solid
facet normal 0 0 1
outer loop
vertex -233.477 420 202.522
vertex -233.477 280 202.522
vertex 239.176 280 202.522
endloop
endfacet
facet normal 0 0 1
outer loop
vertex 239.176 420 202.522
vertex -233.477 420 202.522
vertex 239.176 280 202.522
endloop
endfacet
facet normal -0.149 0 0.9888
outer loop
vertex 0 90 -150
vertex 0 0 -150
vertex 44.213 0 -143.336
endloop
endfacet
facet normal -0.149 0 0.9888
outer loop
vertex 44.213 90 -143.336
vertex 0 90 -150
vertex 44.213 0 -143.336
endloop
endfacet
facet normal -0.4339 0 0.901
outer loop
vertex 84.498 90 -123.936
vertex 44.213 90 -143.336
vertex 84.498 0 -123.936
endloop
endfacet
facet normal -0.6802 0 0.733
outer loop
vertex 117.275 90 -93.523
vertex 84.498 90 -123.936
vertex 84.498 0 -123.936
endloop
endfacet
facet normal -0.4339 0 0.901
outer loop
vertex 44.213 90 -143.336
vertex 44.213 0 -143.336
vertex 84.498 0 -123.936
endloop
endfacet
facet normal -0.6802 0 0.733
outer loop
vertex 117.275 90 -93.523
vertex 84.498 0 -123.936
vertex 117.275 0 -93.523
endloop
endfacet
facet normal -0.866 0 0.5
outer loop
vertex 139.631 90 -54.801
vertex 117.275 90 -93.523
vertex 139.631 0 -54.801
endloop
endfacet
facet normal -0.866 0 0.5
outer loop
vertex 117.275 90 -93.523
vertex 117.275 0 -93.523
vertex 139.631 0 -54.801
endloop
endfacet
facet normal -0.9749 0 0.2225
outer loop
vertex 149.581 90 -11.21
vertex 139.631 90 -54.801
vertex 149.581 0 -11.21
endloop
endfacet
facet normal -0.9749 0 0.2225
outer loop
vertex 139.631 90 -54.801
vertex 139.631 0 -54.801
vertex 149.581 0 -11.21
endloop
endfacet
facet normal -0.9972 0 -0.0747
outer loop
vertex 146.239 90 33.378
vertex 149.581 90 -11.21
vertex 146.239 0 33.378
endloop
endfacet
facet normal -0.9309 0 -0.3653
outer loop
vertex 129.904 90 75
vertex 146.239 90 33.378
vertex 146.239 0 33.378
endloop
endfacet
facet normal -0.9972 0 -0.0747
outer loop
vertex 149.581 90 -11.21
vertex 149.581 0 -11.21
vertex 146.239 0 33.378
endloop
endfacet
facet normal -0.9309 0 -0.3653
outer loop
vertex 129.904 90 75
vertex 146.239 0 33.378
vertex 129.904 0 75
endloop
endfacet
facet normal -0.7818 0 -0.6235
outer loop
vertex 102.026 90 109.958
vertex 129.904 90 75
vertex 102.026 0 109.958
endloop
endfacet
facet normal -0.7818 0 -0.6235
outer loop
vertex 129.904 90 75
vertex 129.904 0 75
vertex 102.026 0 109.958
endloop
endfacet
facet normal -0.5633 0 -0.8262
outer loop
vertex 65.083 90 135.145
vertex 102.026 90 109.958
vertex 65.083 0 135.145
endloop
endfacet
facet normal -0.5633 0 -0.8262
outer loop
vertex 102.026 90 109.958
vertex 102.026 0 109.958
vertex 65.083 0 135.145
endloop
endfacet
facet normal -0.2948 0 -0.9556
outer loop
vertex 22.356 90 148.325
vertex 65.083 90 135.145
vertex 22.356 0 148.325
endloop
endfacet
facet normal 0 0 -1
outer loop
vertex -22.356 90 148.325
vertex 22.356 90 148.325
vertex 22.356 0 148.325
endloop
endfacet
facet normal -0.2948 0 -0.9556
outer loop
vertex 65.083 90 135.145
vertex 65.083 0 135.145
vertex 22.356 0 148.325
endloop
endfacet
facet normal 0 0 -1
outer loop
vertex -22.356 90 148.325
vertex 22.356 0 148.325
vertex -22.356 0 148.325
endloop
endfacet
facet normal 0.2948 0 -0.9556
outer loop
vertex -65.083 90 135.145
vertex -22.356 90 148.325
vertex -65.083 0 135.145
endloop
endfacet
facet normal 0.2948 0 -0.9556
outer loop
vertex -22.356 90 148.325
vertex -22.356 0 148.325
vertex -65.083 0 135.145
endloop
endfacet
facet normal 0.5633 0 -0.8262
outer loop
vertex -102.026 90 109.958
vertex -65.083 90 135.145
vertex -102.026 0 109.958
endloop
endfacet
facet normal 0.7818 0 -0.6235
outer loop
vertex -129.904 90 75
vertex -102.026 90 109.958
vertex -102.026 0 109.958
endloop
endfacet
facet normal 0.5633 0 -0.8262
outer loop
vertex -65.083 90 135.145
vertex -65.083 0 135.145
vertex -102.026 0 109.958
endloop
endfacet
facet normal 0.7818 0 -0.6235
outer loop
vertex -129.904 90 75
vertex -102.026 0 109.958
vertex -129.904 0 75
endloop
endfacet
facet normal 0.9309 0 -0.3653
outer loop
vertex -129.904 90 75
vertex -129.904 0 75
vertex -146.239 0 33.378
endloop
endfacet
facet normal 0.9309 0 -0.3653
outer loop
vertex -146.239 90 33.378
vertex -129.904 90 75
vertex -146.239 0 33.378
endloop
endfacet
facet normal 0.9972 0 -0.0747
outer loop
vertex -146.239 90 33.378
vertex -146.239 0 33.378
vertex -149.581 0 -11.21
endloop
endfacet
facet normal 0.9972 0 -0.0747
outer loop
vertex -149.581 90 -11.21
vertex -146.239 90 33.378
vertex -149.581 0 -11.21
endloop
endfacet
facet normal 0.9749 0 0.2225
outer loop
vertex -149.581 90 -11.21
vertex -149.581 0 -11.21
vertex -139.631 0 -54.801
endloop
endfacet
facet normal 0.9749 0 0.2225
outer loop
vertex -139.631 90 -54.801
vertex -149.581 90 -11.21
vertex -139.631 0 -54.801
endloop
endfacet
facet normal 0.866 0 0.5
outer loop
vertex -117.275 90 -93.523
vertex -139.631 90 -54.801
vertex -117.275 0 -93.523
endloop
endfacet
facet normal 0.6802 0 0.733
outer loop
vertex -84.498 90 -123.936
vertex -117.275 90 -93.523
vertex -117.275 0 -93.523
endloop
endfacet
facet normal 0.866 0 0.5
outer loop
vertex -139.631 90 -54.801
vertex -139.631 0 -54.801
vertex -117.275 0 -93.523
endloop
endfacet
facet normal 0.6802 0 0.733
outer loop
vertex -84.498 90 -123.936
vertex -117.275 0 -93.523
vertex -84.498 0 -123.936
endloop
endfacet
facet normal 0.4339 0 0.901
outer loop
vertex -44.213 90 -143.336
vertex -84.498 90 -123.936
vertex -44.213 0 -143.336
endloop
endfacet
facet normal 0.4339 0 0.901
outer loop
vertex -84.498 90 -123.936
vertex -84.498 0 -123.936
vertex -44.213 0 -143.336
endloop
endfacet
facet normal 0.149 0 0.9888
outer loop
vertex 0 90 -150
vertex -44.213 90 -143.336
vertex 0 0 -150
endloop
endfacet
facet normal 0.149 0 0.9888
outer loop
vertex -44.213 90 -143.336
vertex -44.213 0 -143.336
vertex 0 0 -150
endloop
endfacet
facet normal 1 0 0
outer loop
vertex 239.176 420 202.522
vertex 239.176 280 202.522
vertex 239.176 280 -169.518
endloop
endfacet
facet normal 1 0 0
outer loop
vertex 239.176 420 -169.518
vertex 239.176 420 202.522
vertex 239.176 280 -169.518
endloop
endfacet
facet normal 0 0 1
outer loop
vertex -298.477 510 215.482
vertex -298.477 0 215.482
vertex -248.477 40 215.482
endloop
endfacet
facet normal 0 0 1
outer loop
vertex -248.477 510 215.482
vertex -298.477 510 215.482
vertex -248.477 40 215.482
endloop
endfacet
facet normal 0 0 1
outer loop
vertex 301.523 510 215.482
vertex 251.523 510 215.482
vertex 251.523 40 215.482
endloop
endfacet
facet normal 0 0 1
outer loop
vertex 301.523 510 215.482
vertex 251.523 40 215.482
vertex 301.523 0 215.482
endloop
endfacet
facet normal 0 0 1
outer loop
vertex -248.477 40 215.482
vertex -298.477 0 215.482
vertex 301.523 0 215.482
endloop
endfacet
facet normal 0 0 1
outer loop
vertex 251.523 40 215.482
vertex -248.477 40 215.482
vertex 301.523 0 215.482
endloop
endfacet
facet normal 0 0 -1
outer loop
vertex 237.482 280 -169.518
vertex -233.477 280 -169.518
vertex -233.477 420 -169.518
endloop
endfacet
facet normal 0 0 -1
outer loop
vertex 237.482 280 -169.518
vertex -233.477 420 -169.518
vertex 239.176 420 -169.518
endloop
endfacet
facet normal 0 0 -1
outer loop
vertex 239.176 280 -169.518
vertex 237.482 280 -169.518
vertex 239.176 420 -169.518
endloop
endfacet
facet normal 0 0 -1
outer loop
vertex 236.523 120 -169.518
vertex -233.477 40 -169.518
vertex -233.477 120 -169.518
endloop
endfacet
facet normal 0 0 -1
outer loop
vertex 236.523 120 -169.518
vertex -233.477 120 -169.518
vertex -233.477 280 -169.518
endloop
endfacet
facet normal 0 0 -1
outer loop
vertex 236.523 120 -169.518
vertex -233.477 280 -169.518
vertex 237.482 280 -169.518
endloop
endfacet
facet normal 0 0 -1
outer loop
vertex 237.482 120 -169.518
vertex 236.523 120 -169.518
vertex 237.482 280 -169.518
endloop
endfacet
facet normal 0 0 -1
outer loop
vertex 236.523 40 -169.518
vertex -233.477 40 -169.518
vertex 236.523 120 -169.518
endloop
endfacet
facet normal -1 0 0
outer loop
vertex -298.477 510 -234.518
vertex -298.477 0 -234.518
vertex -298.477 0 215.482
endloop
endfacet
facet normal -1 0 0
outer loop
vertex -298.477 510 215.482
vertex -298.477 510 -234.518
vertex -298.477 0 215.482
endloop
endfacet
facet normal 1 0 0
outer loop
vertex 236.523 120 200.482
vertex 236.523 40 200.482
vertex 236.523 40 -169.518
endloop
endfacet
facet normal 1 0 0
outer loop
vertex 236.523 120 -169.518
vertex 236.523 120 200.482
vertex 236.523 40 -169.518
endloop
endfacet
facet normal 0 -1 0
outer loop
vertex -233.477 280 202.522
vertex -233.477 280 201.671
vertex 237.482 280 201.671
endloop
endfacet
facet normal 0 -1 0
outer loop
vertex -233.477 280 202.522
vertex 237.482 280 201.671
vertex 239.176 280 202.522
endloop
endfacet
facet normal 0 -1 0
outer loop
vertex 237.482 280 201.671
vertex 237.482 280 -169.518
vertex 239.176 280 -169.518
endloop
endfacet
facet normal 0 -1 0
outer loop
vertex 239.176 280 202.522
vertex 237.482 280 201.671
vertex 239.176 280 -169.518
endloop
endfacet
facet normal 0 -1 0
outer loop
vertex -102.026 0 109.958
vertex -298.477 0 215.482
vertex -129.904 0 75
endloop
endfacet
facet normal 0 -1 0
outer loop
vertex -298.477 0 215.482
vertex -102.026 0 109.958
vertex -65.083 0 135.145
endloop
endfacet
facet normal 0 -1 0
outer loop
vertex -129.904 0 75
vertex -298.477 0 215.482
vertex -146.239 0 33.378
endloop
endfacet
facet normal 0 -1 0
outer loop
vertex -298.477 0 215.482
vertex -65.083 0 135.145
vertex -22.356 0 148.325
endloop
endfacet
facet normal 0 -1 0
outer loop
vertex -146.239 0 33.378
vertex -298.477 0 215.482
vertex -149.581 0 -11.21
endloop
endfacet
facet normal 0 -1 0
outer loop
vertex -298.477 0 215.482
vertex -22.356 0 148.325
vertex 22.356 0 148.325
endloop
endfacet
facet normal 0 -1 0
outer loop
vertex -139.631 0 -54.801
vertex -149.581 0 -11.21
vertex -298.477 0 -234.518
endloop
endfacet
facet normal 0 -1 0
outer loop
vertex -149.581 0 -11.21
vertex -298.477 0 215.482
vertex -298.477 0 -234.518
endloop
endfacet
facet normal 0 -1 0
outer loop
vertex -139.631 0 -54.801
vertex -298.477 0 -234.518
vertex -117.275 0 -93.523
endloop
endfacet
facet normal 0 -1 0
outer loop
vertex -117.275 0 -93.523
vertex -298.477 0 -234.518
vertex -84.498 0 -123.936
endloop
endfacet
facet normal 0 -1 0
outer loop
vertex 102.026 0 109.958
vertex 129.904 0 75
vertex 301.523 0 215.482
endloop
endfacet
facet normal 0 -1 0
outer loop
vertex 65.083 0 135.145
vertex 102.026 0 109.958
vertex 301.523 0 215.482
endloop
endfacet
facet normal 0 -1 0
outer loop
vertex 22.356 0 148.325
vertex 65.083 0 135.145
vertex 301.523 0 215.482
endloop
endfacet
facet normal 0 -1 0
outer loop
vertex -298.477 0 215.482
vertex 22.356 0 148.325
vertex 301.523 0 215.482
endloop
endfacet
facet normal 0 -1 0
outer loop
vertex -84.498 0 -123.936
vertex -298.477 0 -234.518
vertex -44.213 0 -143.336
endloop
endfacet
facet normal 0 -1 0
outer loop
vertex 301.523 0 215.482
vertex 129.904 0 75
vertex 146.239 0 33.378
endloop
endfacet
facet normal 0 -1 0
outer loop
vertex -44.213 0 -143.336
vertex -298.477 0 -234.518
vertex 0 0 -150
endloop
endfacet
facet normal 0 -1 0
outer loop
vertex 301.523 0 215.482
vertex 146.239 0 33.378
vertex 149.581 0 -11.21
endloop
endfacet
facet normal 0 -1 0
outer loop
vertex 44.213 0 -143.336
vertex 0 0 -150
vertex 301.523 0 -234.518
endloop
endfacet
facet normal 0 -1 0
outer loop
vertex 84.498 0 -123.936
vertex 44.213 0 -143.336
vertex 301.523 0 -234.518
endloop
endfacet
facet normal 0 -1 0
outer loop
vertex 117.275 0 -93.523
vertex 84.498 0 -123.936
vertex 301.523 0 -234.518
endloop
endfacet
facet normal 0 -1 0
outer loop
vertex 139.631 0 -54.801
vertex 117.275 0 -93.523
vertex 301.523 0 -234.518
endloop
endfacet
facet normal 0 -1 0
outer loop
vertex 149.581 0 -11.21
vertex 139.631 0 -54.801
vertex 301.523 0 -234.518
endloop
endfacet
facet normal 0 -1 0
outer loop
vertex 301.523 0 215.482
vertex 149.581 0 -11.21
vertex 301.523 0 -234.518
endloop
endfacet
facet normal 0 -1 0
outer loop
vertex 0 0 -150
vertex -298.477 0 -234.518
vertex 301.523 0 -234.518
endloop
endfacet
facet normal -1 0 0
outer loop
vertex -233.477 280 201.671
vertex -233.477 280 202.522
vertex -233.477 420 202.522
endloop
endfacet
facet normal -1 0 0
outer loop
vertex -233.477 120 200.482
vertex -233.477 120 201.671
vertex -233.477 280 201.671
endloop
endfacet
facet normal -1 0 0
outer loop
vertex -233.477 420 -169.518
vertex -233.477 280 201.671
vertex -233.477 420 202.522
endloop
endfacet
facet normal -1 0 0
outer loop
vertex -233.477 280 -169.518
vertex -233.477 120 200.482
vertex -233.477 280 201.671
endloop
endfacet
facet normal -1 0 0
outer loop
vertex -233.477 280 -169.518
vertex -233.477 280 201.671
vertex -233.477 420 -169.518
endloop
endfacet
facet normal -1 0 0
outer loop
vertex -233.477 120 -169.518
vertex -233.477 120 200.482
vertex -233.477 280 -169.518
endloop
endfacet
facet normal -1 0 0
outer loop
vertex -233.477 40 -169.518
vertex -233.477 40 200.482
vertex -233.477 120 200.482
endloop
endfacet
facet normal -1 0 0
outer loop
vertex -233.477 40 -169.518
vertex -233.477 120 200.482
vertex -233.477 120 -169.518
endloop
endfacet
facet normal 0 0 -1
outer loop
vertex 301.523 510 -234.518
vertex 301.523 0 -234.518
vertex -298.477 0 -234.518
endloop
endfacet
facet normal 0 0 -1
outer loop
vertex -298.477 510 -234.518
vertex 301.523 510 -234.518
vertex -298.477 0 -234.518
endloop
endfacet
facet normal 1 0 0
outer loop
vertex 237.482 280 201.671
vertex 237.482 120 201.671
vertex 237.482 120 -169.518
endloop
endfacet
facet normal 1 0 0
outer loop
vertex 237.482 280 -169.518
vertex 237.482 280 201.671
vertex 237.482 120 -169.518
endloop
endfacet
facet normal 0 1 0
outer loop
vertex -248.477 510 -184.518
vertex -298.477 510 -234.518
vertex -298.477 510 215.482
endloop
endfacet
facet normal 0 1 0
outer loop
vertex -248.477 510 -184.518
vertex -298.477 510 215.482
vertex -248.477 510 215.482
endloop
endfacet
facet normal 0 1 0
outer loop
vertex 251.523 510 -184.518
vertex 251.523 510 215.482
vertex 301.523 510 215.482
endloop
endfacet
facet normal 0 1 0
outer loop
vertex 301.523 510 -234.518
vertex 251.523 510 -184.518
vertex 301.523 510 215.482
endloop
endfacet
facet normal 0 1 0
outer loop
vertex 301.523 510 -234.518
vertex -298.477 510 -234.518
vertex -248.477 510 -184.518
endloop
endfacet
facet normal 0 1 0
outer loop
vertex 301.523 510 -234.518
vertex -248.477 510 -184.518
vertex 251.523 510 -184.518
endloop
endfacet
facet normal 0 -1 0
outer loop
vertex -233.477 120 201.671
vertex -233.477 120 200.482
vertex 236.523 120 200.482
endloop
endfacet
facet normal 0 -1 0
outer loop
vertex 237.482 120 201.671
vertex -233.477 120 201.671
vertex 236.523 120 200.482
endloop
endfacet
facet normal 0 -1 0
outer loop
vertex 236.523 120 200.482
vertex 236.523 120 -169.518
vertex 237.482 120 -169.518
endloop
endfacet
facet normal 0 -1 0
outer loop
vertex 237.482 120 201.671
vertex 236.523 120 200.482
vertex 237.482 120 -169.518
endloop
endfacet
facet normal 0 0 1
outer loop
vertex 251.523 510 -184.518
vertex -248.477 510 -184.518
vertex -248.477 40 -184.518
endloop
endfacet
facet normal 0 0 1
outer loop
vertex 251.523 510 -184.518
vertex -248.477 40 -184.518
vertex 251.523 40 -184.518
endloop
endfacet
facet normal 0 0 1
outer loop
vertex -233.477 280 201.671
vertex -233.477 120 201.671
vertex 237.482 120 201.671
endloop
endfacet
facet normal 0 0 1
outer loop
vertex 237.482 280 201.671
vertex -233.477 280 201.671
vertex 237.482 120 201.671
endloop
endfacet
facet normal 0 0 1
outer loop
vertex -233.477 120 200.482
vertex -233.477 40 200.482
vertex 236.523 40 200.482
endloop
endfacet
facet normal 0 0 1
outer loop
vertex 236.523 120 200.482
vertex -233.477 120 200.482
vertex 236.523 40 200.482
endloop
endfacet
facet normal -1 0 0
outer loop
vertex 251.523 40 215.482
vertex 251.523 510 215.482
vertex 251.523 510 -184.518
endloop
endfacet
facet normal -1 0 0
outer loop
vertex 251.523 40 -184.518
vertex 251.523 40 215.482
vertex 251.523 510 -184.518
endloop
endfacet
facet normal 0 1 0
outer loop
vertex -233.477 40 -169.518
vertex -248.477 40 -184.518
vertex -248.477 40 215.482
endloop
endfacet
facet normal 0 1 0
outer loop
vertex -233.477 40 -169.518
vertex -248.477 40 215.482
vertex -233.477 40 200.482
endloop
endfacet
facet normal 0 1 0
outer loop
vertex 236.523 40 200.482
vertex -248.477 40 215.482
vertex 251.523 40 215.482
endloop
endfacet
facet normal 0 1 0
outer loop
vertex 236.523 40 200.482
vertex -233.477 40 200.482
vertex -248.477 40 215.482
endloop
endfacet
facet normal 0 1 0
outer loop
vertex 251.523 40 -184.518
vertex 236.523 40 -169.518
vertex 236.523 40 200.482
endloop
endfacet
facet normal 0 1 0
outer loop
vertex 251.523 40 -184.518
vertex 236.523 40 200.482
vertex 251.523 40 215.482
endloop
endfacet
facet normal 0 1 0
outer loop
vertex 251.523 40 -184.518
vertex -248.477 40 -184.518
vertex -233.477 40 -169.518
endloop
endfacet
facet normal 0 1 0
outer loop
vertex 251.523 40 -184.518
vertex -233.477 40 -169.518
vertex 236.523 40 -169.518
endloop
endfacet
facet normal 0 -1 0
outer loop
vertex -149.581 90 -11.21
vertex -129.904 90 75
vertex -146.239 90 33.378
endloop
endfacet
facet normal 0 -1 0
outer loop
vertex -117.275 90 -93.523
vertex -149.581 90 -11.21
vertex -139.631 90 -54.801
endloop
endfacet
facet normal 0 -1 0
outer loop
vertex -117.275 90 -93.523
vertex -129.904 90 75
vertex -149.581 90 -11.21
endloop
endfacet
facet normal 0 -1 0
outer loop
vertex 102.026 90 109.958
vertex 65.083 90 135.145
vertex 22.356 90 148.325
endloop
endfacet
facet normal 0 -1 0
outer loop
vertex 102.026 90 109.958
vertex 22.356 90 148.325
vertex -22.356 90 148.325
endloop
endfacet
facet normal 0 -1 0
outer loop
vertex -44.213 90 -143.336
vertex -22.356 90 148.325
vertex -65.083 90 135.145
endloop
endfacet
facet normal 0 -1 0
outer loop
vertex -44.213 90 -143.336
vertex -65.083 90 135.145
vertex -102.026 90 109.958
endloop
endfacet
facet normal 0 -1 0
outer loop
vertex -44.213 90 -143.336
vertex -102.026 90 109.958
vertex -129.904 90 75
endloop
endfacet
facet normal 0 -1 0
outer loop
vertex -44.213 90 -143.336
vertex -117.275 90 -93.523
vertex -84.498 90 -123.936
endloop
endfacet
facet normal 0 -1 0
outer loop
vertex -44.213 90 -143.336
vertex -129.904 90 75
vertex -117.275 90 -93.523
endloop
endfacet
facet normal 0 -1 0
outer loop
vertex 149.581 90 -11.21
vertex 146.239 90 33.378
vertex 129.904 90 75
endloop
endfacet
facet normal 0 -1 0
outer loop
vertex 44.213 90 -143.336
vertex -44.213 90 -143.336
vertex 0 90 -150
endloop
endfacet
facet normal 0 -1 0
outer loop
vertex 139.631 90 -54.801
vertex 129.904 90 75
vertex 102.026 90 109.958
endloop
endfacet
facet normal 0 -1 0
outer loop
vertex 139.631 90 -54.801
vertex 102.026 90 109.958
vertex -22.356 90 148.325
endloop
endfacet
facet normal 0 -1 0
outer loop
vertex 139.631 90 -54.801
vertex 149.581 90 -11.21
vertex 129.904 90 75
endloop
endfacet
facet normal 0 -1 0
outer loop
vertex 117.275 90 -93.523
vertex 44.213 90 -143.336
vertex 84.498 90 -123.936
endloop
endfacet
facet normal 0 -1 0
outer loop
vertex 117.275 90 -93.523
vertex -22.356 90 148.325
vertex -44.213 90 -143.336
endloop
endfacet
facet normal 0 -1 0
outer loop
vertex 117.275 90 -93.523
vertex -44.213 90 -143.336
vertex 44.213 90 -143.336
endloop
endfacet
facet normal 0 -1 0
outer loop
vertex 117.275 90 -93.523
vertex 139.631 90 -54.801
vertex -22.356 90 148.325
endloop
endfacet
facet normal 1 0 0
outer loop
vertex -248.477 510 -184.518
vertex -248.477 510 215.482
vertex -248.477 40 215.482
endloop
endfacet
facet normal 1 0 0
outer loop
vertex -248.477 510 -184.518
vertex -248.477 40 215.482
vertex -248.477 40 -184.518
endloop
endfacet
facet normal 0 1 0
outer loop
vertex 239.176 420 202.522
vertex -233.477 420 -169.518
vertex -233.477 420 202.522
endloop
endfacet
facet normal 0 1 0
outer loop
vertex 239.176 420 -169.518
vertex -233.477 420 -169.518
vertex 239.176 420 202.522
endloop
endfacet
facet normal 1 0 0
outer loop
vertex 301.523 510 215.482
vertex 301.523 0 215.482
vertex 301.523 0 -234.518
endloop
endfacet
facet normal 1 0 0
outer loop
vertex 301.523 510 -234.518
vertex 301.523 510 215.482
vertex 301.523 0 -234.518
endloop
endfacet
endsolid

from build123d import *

# Parameters (mm, degrees)
SKETCH1_W           = 500
SKETCH1_H           = 400
BOSS_EXTRUDE2_DEPTH = 510
SKETCH2_W           = 500
SKETCH2_H           = 400
CUT_EXTRUDE1_DEPTH  = 470
SKETCH4_W           = 470
SKETCH4_H           = 370
BOSS_EXTRUDE5_DEPTH = 80
SKETCH6_W           = 470.959249671
SKETCH6_H           = 371.189101319
BOSS_EXTRUDE7_DEPTH = 160
SKETCH7_W           = 472.653238371
SKETCH7_H           = 372.039567124
BOSS_EXTRUDE8_DEPTH = 140
SKETCH8_R           = 150
CUT_EXTRUDE2_DEPTH  = 90


with BuildPart() as part:
    # Sketch1 → Boss-Extrude2 (new body)
    with BuildSketch(Plane(origin=(0, 0, 0), x_dir=(1, 0, 0), z_dir=(0, 1, 0))):
        Polygon((-248.47715736, 234.517766497), (-298.47715736, 234.517766497), (-298.47715736, 184.517766497), (-298.47715736, -215.482233503), (-248.47715736, -215.482233503), (-248.47715736, 184.517766497), (251.52284264, 184.517766497), (251.52284264, -215.482233503), (301.52284264, -215.482233503), (301.52284264, 184.517766497), (301.52284264, 234.517766497), (251.52284264, 234.517766497), align=None)
        with Locations((1.52284264, -15.482233503)):
            Rectangle(SKETCH1_W, SKETCH1_H)
    extrude(amount=BOSS_EXTRUDE2_DEPTH)

    # Sketch2 → Cut-Extrude1 (cut)
    with BuildSketch(Plane(origin=(0, 510, 0), x_dir=(1, 0, 0), z_dir=(0, 1, 0))):
        with Locations((1.52284264, -15.482233503)):
            Rectangle(SKETCH2_W, SKETCH2_H)
    extrude(amount=-CUT_EXTRUDE1_DEPTH, mode=Mode.SUBTRACT)

    # Sketch4 → Boss-Extrude5 (add)
    with BuildSketch(Plane(origin=(0, 40, 0), x_dir=(1, 0, 0), z_dir=(0, 1, 0))):
        with Locations((1.52284264, -15.482233503)):
            Rectangle(SKETCH4_W, SKETCH4_H)
    extrude(amount=BOSS_EXTRUDE5_DEPTH)

    # Sketch6 → Boss-Extrude7 (add)
    with BuildSketch(Plane(origin=(0, 120, 0), x_dir=(1, 0, 0), z_dir=(0, 1, 0))):
        with Locations((2.002467475, -16.076784163)):
            Rectangle(SKETCH6_W, SKETCH6_H)
    extrude(amount=BOSS_EXTRUDE7_DEPTH)

    # Sketch7 → Boss-Extrude8 (add)
    with BuildSketch(Plane(origin=(0, 280, 0), x_dir=(1, 0, 0), z_dir=(0, 1, 0))):
        with Locations((2.849461826, -16.502017065)):
            Rectangle(SKETCH7_W, SKETCH7_H)
    extrude(amount=BOSS_EXTRUDE8_DEPTH)

    # Sketch8 → Cut-Extrude2 (cut)
    with BuildSketch(Plane.XZ):
        with Locations(Location((0, 0, 0), (0, 0, 270))):
            Circle(SKETCH8_R)
    extrude(amount=-CUT_EXTRUDE2_DEPTH, mode=Mode.SUBTRACT)


solid = part.part
